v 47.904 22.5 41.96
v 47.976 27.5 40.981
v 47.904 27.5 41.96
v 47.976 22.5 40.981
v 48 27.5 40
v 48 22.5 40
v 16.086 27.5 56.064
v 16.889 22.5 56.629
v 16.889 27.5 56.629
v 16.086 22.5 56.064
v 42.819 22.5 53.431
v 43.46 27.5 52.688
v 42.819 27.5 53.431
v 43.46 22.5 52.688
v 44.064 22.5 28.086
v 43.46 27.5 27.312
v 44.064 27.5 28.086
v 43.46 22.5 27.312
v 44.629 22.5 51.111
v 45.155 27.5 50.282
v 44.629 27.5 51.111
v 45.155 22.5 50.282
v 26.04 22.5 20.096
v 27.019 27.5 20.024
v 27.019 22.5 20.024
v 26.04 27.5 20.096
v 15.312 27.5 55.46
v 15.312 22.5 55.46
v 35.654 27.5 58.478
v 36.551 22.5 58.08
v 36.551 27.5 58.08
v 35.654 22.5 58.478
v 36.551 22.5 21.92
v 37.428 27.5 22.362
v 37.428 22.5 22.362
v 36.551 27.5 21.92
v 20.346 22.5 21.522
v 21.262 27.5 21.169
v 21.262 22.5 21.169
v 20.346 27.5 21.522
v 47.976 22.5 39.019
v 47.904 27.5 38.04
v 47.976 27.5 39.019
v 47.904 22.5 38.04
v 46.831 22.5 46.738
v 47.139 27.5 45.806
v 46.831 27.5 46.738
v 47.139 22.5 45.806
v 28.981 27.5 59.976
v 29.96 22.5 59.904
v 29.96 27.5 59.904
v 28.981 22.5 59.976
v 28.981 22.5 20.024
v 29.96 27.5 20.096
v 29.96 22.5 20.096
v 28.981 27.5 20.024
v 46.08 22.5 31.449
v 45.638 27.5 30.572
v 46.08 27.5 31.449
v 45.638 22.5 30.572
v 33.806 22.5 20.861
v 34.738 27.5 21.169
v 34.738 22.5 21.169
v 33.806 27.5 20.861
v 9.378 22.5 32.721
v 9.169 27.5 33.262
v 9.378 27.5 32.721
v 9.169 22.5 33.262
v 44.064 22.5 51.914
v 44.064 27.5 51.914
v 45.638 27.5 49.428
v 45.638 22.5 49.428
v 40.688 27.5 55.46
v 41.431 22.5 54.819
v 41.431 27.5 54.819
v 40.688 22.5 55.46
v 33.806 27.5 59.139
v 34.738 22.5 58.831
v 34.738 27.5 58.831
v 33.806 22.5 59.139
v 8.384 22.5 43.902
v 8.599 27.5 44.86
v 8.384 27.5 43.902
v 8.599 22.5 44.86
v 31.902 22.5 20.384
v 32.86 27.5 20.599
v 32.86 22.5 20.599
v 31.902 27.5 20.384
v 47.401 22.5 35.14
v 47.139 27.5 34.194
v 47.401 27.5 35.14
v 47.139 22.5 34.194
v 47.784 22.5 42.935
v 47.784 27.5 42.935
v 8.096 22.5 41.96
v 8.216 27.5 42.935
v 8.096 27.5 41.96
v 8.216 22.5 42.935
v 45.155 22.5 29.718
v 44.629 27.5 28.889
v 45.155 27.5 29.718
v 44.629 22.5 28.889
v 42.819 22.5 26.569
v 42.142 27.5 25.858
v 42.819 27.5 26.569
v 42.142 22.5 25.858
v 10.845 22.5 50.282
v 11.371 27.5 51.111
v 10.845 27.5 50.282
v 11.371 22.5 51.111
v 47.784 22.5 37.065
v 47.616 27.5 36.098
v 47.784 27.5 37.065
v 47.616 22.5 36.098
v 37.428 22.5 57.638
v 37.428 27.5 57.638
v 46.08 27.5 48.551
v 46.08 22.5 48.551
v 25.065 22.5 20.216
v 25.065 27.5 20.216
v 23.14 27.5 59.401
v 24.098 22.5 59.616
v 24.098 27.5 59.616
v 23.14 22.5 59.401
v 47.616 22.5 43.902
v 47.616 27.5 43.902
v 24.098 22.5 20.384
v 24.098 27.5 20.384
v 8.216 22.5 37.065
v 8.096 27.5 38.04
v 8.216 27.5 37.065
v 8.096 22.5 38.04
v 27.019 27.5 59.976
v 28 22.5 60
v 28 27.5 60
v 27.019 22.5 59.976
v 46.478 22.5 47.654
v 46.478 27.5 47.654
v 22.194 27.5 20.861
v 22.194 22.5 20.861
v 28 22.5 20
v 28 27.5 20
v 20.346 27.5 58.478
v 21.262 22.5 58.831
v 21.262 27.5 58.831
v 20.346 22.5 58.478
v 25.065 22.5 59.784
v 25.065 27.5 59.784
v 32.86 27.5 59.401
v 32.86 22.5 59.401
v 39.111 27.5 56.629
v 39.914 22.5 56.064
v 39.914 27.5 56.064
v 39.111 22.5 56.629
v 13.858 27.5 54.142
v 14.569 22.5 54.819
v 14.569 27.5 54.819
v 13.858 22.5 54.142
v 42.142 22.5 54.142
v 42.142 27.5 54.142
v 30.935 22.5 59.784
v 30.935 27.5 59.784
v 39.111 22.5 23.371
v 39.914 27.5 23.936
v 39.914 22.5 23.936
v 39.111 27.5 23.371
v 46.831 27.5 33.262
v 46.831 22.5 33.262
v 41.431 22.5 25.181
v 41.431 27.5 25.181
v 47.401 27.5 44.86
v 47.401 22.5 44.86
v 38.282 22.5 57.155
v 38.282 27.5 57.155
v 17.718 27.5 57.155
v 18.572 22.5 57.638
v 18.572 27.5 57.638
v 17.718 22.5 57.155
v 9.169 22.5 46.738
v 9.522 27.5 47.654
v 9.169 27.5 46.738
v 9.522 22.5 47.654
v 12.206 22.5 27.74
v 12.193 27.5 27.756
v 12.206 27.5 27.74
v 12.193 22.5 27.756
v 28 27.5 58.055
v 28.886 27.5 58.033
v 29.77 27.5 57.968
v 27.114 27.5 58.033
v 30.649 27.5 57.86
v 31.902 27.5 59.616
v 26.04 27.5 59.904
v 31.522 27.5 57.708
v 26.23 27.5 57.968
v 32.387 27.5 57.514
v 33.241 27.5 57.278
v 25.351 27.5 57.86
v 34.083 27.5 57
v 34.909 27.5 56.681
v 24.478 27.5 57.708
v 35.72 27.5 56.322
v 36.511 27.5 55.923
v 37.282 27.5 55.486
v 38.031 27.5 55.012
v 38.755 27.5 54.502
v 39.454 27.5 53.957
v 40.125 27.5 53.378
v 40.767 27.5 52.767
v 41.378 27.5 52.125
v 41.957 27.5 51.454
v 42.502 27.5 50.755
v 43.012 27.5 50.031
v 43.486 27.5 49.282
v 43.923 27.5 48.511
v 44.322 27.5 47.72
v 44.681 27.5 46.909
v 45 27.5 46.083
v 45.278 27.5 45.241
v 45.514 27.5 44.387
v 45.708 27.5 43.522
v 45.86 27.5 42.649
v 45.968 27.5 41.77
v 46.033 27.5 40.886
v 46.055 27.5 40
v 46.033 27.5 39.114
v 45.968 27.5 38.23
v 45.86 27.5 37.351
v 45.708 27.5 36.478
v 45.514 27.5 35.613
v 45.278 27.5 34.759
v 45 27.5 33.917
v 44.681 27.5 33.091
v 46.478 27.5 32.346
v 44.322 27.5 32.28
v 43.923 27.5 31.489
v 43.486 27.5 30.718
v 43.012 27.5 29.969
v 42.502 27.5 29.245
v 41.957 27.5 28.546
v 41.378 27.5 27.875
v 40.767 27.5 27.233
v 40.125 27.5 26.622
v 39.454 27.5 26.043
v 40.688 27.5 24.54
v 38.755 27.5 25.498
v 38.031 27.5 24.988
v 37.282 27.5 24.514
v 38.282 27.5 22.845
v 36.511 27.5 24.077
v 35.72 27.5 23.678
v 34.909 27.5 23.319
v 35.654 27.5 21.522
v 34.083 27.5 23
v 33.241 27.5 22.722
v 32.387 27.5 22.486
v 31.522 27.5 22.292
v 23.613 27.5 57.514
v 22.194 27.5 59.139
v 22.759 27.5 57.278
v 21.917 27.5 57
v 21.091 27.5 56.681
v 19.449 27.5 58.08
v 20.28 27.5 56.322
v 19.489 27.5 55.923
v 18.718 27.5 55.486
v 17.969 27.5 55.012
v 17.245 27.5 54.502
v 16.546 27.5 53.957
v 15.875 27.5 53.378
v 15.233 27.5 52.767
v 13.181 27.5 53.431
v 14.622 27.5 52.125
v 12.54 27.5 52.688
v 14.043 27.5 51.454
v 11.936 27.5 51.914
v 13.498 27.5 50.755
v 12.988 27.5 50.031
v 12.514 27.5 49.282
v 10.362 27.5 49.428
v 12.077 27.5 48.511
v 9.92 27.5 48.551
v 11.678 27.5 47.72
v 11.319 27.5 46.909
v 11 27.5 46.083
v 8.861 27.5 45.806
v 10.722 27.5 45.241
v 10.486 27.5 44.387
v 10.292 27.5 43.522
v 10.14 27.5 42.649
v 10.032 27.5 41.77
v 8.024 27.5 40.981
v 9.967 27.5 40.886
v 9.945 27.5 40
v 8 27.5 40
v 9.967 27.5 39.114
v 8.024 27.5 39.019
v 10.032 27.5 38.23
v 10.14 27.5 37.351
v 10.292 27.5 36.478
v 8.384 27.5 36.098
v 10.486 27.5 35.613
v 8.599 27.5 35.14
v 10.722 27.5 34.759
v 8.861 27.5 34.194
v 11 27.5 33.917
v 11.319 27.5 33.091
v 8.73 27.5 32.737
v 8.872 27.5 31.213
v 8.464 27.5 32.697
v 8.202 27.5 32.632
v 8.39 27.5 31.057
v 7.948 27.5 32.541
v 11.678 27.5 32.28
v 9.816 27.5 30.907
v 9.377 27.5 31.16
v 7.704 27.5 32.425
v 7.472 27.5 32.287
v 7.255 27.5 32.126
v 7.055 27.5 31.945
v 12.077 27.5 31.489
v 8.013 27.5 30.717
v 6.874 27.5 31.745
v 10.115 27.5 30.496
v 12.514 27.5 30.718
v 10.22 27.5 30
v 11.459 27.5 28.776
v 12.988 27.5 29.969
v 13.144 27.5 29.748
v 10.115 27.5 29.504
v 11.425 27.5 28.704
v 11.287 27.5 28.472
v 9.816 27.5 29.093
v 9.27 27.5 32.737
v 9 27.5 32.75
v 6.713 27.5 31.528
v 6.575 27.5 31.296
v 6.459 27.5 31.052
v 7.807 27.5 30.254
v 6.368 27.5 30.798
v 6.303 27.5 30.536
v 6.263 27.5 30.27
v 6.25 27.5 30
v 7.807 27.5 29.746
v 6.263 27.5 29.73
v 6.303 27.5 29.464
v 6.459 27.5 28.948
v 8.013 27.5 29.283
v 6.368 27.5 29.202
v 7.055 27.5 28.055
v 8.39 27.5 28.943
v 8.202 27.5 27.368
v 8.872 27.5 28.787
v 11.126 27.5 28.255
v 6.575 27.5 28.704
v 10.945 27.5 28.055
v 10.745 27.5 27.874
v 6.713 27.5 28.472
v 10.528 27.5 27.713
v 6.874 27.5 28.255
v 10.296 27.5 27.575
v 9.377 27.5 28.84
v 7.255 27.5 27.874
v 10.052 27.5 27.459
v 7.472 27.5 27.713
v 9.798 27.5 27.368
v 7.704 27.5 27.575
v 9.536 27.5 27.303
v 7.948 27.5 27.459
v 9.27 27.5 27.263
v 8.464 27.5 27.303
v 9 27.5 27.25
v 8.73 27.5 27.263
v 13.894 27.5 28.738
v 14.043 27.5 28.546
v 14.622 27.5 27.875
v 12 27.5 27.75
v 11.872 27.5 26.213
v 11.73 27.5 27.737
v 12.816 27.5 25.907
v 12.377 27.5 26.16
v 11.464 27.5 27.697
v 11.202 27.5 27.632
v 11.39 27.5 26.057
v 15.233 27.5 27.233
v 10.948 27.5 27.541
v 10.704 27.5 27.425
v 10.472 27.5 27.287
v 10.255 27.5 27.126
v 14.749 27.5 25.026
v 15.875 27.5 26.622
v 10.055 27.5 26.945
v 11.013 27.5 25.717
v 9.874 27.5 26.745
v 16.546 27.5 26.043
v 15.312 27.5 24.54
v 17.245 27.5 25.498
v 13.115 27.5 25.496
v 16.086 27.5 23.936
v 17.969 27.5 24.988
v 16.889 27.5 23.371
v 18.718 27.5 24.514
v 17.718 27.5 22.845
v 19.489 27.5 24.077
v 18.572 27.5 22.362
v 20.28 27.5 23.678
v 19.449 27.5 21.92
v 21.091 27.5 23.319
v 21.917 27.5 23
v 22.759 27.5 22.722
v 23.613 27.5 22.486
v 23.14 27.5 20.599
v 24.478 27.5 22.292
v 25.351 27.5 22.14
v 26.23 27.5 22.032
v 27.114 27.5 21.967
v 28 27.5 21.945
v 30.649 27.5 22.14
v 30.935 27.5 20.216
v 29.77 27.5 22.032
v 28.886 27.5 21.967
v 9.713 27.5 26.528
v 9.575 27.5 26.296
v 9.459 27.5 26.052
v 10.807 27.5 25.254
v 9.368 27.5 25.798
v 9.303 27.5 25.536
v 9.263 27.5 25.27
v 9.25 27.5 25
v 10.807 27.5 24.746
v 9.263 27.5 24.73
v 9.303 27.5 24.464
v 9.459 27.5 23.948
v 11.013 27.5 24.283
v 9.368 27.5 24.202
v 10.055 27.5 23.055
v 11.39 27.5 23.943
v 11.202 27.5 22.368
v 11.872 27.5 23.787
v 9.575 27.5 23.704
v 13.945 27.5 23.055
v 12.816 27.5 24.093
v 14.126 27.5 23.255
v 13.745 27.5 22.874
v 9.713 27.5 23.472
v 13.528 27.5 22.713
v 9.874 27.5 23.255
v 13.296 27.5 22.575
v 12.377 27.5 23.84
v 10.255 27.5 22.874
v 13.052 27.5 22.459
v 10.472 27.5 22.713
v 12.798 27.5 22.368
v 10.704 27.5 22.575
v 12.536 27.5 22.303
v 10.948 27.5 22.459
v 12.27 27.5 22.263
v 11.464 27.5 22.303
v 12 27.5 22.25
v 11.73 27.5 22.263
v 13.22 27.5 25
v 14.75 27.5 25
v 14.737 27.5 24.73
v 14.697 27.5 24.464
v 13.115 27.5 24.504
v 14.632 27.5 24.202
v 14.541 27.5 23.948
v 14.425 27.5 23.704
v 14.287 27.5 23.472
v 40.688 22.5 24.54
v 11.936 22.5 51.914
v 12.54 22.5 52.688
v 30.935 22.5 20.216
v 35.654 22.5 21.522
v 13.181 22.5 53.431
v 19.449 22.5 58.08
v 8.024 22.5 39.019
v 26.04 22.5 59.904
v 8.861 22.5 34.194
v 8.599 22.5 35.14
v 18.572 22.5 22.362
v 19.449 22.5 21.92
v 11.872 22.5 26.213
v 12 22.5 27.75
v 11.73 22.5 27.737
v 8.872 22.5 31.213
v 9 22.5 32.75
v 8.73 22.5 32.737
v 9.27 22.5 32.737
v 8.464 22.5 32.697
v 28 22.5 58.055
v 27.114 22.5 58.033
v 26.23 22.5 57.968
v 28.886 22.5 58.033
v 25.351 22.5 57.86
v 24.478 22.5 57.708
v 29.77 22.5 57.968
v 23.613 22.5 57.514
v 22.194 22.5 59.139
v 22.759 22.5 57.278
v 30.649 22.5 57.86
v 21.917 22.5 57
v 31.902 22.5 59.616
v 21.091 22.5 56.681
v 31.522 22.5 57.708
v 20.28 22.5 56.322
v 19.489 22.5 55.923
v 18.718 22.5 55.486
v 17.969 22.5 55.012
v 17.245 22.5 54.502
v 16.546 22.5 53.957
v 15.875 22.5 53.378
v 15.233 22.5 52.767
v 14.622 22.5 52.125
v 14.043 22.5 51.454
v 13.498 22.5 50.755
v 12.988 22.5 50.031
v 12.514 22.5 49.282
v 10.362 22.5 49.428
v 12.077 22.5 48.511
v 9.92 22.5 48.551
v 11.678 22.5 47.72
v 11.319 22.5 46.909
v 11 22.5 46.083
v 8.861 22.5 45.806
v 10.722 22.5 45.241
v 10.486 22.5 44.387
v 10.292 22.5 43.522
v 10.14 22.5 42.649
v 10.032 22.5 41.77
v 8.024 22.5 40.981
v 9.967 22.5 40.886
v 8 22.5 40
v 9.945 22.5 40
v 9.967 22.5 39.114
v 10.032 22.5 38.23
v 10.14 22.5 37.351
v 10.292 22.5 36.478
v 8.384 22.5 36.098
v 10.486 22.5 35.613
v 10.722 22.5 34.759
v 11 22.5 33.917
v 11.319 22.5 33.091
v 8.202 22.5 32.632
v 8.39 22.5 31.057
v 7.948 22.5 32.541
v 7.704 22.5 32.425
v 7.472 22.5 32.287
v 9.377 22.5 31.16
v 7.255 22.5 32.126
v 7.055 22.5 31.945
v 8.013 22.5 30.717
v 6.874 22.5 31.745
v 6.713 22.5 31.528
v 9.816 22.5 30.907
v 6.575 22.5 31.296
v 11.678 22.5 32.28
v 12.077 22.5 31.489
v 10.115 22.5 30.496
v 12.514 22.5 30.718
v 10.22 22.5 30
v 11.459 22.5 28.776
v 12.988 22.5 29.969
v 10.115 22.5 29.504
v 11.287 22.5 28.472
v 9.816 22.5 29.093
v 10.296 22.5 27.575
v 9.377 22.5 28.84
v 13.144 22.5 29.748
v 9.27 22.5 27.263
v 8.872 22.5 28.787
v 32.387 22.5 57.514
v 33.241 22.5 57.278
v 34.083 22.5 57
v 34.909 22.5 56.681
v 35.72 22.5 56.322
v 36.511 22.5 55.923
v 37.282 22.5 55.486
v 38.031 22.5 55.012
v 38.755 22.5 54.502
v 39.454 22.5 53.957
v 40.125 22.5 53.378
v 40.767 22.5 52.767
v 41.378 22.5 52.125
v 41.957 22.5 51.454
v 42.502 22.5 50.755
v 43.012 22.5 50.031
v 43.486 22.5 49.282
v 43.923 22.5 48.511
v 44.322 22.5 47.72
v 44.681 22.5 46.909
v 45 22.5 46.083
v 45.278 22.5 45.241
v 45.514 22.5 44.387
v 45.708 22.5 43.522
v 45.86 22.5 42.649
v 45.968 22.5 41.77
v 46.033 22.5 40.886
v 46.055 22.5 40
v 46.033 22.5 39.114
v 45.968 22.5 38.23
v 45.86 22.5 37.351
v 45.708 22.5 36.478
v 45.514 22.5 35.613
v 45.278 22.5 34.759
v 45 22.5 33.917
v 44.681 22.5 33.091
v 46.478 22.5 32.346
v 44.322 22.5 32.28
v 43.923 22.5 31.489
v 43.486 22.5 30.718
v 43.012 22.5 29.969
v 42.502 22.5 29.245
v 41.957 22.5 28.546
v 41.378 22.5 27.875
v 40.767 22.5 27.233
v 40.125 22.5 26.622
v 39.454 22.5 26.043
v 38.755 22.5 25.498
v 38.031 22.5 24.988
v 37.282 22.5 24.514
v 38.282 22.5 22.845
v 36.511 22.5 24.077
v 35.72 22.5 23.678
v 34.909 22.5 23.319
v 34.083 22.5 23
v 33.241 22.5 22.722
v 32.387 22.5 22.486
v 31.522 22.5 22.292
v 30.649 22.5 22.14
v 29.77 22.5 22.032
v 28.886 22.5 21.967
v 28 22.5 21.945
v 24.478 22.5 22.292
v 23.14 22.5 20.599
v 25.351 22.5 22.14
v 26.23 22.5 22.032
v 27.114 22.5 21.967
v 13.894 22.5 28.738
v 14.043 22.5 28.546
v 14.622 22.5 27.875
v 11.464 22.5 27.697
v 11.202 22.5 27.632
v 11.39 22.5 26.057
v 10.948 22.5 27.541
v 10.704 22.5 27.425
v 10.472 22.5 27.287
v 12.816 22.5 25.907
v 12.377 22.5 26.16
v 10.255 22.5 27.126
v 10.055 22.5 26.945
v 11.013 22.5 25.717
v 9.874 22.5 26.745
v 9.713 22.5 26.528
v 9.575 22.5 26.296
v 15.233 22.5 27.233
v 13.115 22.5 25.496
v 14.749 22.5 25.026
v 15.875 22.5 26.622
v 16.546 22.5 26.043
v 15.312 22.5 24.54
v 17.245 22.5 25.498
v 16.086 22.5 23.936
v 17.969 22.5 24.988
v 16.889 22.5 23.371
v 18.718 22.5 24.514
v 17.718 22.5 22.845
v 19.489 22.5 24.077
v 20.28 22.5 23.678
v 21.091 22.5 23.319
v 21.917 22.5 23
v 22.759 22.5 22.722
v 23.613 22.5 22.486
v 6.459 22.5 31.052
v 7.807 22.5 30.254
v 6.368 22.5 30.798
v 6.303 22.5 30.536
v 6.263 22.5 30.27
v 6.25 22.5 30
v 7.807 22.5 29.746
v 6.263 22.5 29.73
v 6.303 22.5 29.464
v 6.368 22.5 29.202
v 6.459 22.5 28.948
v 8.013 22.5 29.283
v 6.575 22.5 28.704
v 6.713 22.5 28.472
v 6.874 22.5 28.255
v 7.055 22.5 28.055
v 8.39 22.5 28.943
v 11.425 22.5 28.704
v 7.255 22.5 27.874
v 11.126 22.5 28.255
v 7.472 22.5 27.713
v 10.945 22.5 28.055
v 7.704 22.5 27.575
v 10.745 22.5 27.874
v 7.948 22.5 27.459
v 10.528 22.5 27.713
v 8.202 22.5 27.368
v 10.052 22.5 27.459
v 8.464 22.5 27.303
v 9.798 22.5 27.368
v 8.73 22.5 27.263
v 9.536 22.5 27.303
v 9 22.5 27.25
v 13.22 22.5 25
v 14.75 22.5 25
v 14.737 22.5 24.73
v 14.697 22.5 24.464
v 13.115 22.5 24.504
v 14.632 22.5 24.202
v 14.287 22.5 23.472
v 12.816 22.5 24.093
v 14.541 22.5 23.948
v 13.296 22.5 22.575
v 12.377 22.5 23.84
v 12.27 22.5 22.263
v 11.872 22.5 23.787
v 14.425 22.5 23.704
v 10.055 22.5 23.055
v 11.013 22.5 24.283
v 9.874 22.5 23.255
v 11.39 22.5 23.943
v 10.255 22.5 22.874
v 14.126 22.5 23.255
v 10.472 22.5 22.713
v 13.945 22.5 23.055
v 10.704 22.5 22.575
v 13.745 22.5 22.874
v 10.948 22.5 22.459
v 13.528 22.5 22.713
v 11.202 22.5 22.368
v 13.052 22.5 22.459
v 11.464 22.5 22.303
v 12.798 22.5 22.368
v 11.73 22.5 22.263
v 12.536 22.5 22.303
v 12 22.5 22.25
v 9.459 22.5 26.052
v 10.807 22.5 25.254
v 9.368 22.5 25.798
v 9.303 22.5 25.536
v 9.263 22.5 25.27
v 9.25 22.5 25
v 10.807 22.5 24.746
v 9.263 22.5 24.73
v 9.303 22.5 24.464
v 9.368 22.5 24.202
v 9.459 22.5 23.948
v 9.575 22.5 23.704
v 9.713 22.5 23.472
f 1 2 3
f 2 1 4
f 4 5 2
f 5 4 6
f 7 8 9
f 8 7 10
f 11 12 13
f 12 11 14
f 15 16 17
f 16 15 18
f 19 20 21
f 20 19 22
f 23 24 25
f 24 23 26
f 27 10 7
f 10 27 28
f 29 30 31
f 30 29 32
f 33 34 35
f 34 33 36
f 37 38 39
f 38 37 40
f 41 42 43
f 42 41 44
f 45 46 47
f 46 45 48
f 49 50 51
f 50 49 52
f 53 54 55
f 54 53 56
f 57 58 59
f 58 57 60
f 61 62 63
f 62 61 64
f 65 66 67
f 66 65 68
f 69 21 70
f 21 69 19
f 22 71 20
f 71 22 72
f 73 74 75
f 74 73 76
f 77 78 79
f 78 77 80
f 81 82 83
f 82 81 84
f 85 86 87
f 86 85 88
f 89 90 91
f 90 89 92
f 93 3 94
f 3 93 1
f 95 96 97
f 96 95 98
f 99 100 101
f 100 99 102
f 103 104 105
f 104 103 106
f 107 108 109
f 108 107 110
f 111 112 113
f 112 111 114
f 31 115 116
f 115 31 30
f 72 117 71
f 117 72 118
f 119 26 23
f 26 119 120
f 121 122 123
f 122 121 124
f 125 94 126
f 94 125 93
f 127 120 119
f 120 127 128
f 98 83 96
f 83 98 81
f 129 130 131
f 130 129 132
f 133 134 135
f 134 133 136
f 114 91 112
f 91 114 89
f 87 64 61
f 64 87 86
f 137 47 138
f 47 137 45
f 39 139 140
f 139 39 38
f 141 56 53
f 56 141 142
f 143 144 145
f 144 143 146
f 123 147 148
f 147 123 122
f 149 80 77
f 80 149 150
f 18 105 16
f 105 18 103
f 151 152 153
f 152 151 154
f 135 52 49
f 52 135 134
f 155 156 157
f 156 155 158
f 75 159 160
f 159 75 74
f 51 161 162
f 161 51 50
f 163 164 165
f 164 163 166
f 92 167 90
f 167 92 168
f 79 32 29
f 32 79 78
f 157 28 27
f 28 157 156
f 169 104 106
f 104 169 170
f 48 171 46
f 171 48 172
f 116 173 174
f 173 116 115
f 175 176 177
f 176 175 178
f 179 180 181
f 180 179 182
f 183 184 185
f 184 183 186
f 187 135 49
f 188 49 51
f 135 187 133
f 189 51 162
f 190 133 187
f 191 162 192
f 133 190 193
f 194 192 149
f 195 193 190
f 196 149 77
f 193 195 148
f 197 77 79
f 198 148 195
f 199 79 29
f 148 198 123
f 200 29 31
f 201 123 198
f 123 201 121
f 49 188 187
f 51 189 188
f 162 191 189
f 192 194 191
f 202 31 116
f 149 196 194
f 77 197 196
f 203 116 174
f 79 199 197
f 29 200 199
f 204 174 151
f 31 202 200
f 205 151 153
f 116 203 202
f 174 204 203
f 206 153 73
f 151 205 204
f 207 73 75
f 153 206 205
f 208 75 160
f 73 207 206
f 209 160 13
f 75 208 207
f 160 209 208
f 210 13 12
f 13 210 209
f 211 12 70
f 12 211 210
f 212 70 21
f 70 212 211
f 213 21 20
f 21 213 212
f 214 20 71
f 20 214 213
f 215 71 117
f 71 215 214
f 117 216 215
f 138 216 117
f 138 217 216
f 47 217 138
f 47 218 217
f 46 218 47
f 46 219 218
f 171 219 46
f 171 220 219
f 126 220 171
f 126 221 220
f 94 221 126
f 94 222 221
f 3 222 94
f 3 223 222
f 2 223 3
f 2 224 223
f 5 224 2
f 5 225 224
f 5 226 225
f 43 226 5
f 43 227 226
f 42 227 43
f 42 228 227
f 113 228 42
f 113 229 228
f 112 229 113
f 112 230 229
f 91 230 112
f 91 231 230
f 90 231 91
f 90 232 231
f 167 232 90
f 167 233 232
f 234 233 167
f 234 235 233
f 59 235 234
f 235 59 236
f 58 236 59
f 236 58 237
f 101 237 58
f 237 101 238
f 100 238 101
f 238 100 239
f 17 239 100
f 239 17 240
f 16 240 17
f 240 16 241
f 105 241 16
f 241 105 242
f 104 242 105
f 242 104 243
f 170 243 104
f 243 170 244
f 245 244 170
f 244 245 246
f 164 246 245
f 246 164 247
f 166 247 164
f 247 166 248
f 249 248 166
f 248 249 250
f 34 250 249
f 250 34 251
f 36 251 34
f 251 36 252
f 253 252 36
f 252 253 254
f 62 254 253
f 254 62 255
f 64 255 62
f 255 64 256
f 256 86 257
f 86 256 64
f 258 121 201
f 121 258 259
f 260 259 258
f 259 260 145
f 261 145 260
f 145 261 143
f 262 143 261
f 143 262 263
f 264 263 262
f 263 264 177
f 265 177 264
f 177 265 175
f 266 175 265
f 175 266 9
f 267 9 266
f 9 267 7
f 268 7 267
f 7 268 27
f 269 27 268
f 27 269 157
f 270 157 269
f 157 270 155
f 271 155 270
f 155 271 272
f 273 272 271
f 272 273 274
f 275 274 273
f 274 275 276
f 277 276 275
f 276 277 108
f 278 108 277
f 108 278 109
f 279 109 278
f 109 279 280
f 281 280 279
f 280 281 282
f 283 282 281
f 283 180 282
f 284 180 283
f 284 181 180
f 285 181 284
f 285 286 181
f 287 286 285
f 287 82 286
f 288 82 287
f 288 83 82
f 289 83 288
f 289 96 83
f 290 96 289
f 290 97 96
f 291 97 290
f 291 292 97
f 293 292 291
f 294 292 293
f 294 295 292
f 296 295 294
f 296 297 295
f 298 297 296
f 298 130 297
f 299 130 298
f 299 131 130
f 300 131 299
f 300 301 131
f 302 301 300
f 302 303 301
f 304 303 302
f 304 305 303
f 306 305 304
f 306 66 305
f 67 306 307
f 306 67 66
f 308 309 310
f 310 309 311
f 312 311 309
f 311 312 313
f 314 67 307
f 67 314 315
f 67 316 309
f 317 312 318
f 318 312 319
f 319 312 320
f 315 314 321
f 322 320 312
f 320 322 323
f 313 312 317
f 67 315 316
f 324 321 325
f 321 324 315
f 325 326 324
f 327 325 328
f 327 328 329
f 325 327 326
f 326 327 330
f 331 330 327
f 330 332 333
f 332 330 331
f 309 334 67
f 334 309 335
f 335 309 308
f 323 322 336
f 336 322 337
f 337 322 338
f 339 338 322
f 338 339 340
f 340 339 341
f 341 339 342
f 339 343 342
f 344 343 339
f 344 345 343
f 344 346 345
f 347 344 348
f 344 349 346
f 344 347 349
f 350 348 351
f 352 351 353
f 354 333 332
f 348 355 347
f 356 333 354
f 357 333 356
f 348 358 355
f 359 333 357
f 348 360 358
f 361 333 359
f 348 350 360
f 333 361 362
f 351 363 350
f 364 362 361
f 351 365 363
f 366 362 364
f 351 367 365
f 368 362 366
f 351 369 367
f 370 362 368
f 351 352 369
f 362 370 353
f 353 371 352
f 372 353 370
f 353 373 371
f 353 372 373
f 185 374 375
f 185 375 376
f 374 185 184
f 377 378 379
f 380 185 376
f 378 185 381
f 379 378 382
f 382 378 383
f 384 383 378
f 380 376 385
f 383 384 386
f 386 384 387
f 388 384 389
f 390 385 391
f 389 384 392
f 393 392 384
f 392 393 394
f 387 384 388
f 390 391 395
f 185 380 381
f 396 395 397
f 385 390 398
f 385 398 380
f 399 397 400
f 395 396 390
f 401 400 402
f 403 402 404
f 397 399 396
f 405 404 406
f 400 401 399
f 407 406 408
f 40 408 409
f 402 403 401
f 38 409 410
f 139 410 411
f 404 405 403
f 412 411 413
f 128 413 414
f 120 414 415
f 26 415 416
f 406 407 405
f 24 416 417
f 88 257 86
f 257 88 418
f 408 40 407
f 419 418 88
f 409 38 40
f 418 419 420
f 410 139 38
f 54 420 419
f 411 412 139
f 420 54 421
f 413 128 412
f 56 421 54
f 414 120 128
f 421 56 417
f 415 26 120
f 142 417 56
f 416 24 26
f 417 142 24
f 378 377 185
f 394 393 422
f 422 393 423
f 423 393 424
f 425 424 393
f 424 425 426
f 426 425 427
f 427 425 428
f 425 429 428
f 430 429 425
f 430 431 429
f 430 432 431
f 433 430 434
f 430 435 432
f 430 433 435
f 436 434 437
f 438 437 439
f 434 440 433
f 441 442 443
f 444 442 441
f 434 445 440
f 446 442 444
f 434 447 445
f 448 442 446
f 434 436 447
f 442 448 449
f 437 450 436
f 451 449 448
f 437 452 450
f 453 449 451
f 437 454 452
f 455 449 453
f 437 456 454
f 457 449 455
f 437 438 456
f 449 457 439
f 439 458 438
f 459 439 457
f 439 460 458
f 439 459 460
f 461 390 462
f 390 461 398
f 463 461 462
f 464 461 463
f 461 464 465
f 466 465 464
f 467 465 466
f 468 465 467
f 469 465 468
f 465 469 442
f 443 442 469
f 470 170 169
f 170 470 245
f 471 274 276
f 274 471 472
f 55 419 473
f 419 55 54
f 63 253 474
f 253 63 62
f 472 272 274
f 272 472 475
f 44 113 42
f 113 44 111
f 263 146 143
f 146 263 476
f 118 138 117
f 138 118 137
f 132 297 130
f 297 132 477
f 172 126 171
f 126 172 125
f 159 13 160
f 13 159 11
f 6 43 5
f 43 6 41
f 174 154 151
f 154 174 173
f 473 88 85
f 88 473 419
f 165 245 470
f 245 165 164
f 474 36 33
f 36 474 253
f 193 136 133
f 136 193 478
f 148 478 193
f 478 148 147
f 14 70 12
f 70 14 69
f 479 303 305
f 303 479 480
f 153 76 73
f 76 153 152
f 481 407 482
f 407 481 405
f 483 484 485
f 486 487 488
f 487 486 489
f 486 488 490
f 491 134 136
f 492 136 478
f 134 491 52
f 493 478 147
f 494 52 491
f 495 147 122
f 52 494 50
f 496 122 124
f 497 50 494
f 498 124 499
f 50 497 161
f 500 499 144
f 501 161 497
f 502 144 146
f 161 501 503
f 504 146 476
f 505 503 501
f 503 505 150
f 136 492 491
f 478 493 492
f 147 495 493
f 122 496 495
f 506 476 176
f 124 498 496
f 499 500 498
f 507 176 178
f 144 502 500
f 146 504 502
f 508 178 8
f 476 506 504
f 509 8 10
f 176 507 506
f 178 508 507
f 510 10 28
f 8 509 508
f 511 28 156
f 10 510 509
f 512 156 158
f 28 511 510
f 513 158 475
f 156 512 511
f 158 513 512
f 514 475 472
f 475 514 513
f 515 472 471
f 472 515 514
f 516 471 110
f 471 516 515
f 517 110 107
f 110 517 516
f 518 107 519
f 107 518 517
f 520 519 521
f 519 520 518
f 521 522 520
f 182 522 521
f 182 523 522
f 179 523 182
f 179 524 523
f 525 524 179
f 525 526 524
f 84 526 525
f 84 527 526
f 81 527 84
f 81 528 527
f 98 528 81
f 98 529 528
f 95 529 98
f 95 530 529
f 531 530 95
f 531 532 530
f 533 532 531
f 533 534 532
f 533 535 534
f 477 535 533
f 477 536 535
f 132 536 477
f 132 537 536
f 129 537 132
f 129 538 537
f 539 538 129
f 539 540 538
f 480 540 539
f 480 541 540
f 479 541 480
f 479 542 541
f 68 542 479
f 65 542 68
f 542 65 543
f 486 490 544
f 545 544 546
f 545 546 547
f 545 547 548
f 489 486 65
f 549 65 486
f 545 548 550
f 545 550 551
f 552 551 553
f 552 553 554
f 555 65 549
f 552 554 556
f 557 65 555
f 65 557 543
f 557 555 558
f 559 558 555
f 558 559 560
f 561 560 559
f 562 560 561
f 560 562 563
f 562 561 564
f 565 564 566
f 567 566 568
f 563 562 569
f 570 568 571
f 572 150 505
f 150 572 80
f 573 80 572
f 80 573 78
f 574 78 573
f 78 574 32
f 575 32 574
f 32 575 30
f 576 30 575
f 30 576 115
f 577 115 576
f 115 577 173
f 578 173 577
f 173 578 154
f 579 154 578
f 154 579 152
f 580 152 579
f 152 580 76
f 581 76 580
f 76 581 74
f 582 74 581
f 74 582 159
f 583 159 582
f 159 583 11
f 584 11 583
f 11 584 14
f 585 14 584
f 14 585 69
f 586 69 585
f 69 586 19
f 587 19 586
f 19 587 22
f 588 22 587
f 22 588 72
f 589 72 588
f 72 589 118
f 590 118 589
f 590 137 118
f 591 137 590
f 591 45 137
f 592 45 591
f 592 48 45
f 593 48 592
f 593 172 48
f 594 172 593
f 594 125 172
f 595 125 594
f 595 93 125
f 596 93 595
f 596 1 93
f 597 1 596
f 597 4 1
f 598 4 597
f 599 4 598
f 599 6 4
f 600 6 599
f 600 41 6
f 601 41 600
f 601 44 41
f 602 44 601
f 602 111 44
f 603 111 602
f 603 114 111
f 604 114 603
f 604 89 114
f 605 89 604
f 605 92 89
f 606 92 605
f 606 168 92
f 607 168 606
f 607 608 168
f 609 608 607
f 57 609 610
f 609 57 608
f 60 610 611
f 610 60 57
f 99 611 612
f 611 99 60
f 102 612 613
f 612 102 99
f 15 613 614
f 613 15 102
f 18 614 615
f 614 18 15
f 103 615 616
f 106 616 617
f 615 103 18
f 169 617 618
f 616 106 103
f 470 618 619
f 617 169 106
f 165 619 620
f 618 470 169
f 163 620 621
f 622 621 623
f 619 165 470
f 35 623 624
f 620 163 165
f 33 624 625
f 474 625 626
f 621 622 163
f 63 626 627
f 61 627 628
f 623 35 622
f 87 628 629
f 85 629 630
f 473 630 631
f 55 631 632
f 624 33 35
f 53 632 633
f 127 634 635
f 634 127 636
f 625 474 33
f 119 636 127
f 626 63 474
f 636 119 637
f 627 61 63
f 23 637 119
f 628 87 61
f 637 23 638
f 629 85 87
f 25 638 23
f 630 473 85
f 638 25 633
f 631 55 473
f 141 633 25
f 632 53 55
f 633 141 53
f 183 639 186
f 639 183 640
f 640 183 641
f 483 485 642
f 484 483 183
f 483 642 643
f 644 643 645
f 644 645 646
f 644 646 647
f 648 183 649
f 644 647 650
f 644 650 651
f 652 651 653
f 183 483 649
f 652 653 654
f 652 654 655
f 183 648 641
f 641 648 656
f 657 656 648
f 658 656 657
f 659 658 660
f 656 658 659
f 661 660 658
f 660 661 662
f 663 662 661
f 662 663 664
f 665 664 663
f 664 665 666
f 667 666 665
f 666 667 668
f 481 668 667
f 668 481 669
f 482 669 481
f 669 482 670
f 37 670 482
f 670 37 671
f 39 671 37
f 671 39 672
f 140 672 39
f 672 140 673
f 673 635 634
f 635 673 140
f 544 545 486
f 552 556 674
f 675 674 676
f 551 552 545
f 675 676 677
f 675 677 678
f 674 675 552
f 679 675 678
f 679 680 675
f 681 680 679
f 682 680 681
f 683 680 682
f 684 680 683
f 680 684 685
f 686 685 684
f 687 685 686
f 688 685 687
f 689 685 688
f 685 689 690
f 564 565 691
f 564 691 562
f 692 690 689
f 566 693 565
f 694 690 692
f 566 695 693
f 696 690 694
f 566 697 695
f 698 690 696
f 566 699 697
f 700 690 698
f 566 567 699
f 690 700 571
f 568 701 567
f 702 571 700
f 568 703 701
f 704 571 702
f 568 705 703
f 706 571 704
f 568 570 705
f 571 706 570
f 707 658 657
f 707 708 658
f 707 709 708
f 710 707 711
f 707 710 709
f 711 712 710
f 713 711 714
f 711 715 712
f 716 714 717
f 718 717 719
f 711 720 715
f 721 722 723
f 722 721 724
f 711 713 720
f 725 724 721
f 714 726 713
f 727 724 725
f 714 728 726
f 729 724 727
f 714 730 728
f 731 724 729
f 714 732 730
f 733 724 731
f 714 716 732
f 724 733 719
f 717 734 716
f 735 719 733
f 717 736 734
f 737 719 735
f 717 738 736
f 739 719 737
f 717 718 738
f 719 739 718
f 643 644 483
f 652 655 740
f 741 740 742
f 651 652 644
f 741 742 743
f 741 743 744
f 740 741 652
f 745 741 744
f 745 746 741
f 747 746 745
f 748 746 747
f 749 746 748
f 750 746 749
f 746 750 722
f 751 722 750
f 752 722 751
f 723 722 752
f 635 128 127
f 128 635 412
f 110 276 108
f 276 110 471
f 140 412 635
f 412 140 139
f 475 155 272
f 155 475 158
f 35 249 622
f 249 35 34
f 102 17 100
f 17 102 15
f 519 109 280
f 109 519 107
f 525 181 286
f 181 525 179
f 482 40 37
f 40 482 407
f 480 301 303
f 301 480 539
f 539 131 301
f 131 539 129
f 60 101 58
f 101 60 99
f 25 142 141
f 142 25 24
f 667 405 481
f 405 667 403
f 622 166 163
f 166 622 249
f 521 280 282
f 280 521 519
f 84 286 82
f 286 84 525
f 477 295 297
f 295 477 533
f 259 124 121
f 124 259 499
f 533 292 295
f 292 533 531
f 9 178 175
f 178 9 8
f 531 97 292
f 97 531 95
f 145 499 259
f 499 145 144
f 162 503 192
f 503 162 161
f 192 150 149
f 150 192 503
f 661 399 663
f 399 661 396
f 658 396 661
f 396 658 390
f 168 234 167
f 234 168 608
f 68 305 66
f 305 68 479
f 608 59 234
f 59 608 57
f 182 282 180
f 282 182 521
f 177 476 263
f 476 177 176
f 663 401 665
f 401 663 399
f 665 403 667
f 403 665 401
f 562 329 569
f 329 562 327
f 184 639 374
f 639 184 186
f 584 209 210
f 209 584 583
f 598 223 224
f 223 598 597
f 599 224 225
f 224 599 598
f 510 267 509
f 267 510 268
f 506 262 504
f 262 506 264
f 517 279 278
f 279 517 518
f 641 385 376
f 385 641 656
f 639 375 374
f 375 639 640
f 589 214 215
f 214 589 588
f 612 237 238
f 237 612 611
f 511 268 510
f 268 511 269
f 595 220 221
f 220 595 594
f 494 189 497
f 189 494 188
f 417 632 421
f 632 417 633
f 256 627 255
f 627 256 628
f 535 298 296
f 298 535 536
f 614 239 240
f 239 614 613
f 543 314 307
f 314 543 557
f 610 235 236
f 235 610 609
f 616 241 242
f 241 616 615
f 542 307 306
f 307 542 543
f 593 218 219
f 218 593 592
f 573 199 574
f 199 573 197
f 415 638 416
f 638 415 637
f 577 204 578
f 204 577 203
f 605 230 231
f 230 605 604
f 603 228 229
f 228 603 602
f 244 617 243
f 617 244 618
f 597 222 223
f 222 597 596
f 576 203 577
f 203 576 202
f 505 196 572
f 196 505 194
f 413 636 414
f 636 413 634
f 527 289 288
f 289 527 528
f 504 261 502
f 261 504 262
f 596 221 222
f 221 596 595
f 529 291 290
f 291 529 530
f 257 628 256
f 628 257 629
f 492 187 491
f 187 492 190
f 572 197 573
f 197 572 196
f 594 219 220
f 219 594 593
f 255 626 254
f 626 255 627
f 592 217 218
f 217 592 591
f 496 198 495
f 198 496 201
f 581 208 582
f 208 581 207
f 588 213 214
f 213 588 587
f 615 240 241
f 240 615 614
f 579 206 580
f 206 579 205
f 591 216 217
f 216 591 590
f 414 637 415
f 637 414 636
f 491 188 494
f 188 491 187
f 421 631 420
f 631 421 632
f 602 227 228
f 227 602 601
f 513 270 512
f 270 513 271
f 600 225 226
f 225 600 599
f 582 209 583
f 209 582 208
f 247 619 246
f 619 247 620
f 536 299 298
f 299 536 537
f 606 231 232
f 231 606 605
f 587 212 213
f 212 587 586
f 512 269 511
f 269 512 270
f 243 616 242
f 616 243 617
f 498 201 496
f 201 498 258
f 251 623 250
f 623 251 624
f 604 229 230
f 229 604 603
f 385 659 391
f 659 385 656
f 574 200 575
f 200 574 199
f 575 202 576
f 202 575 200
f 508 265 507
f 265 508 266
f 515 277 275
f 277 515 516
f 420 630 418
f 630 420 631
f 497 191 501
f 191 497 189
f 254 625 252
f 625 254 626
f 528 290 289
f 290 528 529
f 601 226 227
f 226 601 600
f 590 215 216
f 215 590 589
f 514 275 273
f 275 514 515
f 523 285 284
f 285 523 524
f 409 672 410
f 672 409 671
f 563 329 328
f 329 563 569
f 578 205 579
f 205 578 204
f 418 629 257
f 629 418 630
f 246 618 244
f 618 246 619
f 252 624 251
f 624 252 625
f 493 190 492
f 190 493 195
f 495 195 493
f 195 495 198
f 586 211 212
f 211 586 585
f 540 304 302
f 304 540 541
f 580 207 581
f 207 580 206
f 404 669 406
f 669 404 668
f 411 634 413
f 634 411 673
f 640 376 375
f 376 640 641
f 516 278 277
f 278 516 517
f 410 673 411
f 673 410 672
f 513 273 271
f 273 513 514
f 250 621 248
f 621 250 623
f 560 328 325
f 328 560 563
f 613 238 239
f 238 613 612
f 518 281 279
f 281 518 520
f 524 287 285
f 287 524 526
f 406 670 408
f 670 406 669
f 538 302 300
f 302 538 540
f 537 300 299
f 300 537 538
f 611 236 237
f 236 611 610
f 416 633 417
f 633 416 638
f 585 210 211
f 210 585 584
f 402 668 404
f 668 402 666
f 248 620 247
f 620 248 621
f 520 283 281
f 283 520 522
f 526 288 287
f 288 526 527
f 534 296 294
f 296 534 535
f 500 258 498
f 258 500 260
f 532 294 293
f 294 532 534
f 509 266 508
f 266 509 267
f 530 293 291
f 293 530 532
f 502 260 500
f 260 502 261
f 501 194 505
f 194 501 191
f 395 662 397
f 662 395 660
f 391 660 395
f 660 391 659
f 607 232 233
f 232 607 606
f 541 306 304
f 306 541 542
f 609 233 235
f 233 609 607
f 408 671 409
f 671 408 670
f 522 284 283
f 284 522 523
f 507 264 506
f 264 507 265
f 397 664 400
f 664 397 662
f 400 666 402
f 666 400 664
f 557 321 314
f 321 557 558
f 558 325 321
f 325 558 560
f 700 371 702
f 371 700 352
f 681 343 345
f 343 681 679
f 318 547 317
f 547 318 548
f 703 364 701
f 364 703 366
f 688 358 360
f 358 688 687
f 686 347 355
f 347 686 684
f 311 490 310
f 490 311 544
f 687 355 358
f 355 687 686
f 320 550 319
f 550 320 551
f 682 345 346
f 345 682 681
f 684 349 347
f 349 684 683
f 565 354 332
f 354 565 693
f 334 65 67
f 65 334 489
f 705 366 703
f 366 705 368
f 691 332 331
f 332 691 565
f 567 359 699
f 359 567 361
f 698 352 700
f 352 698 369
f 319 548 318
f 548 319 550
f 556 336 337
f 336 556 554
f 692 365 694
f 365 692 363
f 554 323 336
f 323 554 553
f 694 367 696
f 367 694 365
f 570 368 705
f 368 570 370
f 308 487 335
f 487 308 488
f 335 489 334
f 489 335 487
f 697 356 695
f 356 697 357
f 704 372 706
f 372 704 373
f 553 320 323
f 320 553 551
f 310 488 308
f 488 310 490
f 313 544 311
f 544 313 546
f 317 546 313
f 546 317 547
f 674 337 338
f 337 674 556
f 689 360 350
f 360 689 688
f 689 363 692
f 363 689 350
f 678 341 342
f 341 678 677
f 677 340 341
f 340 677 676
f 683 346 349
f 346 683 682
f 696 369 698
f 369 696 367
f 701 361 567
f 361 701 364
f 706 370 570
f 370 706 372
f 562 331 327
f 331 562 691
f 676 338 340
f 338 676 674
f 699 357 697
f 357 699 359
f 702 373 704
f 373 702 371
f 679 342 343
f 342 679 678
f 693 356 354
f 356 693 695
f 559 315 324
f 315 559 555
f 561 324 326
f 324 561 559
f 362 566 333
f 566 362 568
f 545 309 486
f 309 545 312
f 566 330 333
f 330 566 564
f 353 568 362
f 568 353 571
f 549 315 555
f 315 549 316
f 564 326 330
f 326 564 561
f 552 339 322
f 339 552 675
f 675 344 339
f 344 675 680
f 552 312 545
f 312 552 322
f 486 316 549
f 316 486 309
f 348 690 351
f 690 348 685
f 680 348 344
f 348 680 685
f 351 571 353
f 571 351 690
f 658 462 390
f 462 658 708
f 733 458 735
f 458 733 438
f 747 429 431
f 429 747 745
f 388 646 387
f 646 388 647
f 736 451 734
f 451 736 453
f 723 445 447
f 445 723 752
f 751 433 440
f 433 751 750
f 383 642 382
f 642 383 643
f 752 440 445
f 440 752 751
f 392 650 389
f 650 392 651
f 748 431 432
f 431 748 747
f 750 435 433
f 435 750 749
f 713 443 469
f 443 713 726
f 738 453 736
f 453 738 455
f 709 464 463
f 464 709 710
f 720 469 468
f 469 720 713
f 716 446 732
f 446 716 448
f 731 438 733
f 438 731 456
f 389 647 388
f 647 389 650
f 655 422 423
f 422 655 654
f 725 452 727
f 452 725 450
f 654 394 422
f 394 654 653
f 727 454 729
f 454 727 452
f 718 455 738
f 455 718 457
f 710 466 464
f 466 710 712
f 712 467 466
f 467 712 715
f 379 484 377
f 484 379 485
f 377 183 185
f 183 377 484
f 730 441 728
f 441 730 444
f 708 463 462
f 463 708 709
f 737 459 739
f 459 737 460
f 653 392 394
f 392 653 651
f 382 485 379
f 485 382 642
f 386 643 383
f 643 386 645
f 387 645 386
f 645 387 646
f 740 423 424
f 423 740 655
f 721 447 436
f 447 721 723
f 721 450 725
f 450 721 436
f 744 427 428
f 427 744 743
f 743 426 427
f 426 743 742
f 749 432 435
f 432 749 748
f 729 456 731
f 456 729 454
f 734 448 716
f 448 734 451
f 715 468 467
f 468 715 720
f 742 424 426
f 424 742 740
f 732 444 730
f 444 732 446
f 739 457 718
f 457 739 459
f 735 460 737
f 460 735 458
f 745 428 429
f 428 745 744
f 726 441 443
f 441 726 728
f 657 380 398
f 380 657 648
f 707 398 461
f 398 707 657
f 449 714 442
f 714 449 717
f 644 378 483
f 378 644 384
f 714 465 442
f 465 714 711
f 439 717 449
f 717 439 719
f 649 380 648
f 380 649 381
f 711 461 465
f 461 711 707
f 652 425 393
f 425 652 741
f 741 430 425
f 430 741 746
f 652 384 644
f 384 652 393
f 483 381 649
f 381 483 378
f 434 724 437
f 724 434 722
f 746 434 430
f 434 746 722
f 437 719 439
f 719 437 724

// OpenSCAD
// ----------------------------------------------------------------------------------------------------
// PROJECT INFORMATION

// NAME:  R/C Mower Trailer
// REVISION:  A1
// START DATE:  8/20/2021
// CURRENT VERSION DATE:  9/2/2021
// LICENSE:  GPLv3
// AUTHOR:  Justin Grimes (@zelon88)
// DESCRIPTION:  A tow-behind lawn mowing attachment for retrofit onto low-speed R/C vehicles.
// ----------------------------------------------------------------------------------------------------

// ----------------------------------------------------------------------------------------------------
// PART INFORMATION

// NAME:  Motor Clamp
// REVISION:  A1
// START DATE:  11/22/2021
// CURRENT VERSION DATE:  11/22/2021
// AUTHOR:  Justin Grimes (@zelon88)
// DESCRIPTION:
//    The motor clamp secures the rear of the motor to the opposite side upright of the center bracket.
// FILE NAME: Motor_Clamp.scad
// ----------------------------------------------------------------------------------------------------

// ----------------------------------------------------------------------------------------------------
// PRINTER CONFIGURATION
// [Printing instructions to be added]
// ----------------------------------------------------------------------------------------------------

// ----------------------------------------------------------------------------------------------------
// MANUFACTURING INSTRUCTIONS

// 1. Deburr all edges to break sharp edges.
// 2. Make studs by installing extra long screws and cutting off the heads.
// ----------------------------------------------------------------------------------------------------

// ----------------------------------------------------------------------------------------------------
// GEOMETRY

module Motor_Clamp() {
  difference() {
    // Main body of ring.
    translate([28, 25, 40]) rotate([90, 0, 0]) cylinder($fn=128, r=20, h=5, center=true);

    // Slot.
    translate([10.5, 25, 27.5]) rotate([90, 60, 0]) cube([1.25, 10, 5], center=true);
    // Through hole for motor.
    translate([28, 25, 40]) rotate([90, 0, 0]) cylinder($fn=128, r=18.055, h=5, center=true); }

  difference() {
    // Main body of upper clamp screw boss.
    translate([9, 25, 30]) rotate([90, 0, 0]) cylinder($fn=64, r=2.75, h=5, center=true);

    // Through hole, motor clamp mounting screw, center.
    translate([9, 25, 30]) rotate([90, 0, 0]) cylinder($fn=15, r=1.22, h=5, center=true); }

  difference() {
    // Main body of lower clamp screw boss.
    translate([12, 25, 25]) rotate([90, 0, 0]) cylinder($fn=64, r=2.75, h=5, center=true);

    // Through hole, motor clamp mounting screw, left.
    translate([12, 25, 25]) rotate([90, 0, 0]) cylinder($fn=15, r=1.22, h=5, center=true); } }

// Render the object.
// Comment or uncomment as needed.
Motor_Clamp();

// Render the object for printing.
// Comment or uncomment as needed.
//Motor_Clamp();
// ----------------------------------------------------------------------------------------------------
